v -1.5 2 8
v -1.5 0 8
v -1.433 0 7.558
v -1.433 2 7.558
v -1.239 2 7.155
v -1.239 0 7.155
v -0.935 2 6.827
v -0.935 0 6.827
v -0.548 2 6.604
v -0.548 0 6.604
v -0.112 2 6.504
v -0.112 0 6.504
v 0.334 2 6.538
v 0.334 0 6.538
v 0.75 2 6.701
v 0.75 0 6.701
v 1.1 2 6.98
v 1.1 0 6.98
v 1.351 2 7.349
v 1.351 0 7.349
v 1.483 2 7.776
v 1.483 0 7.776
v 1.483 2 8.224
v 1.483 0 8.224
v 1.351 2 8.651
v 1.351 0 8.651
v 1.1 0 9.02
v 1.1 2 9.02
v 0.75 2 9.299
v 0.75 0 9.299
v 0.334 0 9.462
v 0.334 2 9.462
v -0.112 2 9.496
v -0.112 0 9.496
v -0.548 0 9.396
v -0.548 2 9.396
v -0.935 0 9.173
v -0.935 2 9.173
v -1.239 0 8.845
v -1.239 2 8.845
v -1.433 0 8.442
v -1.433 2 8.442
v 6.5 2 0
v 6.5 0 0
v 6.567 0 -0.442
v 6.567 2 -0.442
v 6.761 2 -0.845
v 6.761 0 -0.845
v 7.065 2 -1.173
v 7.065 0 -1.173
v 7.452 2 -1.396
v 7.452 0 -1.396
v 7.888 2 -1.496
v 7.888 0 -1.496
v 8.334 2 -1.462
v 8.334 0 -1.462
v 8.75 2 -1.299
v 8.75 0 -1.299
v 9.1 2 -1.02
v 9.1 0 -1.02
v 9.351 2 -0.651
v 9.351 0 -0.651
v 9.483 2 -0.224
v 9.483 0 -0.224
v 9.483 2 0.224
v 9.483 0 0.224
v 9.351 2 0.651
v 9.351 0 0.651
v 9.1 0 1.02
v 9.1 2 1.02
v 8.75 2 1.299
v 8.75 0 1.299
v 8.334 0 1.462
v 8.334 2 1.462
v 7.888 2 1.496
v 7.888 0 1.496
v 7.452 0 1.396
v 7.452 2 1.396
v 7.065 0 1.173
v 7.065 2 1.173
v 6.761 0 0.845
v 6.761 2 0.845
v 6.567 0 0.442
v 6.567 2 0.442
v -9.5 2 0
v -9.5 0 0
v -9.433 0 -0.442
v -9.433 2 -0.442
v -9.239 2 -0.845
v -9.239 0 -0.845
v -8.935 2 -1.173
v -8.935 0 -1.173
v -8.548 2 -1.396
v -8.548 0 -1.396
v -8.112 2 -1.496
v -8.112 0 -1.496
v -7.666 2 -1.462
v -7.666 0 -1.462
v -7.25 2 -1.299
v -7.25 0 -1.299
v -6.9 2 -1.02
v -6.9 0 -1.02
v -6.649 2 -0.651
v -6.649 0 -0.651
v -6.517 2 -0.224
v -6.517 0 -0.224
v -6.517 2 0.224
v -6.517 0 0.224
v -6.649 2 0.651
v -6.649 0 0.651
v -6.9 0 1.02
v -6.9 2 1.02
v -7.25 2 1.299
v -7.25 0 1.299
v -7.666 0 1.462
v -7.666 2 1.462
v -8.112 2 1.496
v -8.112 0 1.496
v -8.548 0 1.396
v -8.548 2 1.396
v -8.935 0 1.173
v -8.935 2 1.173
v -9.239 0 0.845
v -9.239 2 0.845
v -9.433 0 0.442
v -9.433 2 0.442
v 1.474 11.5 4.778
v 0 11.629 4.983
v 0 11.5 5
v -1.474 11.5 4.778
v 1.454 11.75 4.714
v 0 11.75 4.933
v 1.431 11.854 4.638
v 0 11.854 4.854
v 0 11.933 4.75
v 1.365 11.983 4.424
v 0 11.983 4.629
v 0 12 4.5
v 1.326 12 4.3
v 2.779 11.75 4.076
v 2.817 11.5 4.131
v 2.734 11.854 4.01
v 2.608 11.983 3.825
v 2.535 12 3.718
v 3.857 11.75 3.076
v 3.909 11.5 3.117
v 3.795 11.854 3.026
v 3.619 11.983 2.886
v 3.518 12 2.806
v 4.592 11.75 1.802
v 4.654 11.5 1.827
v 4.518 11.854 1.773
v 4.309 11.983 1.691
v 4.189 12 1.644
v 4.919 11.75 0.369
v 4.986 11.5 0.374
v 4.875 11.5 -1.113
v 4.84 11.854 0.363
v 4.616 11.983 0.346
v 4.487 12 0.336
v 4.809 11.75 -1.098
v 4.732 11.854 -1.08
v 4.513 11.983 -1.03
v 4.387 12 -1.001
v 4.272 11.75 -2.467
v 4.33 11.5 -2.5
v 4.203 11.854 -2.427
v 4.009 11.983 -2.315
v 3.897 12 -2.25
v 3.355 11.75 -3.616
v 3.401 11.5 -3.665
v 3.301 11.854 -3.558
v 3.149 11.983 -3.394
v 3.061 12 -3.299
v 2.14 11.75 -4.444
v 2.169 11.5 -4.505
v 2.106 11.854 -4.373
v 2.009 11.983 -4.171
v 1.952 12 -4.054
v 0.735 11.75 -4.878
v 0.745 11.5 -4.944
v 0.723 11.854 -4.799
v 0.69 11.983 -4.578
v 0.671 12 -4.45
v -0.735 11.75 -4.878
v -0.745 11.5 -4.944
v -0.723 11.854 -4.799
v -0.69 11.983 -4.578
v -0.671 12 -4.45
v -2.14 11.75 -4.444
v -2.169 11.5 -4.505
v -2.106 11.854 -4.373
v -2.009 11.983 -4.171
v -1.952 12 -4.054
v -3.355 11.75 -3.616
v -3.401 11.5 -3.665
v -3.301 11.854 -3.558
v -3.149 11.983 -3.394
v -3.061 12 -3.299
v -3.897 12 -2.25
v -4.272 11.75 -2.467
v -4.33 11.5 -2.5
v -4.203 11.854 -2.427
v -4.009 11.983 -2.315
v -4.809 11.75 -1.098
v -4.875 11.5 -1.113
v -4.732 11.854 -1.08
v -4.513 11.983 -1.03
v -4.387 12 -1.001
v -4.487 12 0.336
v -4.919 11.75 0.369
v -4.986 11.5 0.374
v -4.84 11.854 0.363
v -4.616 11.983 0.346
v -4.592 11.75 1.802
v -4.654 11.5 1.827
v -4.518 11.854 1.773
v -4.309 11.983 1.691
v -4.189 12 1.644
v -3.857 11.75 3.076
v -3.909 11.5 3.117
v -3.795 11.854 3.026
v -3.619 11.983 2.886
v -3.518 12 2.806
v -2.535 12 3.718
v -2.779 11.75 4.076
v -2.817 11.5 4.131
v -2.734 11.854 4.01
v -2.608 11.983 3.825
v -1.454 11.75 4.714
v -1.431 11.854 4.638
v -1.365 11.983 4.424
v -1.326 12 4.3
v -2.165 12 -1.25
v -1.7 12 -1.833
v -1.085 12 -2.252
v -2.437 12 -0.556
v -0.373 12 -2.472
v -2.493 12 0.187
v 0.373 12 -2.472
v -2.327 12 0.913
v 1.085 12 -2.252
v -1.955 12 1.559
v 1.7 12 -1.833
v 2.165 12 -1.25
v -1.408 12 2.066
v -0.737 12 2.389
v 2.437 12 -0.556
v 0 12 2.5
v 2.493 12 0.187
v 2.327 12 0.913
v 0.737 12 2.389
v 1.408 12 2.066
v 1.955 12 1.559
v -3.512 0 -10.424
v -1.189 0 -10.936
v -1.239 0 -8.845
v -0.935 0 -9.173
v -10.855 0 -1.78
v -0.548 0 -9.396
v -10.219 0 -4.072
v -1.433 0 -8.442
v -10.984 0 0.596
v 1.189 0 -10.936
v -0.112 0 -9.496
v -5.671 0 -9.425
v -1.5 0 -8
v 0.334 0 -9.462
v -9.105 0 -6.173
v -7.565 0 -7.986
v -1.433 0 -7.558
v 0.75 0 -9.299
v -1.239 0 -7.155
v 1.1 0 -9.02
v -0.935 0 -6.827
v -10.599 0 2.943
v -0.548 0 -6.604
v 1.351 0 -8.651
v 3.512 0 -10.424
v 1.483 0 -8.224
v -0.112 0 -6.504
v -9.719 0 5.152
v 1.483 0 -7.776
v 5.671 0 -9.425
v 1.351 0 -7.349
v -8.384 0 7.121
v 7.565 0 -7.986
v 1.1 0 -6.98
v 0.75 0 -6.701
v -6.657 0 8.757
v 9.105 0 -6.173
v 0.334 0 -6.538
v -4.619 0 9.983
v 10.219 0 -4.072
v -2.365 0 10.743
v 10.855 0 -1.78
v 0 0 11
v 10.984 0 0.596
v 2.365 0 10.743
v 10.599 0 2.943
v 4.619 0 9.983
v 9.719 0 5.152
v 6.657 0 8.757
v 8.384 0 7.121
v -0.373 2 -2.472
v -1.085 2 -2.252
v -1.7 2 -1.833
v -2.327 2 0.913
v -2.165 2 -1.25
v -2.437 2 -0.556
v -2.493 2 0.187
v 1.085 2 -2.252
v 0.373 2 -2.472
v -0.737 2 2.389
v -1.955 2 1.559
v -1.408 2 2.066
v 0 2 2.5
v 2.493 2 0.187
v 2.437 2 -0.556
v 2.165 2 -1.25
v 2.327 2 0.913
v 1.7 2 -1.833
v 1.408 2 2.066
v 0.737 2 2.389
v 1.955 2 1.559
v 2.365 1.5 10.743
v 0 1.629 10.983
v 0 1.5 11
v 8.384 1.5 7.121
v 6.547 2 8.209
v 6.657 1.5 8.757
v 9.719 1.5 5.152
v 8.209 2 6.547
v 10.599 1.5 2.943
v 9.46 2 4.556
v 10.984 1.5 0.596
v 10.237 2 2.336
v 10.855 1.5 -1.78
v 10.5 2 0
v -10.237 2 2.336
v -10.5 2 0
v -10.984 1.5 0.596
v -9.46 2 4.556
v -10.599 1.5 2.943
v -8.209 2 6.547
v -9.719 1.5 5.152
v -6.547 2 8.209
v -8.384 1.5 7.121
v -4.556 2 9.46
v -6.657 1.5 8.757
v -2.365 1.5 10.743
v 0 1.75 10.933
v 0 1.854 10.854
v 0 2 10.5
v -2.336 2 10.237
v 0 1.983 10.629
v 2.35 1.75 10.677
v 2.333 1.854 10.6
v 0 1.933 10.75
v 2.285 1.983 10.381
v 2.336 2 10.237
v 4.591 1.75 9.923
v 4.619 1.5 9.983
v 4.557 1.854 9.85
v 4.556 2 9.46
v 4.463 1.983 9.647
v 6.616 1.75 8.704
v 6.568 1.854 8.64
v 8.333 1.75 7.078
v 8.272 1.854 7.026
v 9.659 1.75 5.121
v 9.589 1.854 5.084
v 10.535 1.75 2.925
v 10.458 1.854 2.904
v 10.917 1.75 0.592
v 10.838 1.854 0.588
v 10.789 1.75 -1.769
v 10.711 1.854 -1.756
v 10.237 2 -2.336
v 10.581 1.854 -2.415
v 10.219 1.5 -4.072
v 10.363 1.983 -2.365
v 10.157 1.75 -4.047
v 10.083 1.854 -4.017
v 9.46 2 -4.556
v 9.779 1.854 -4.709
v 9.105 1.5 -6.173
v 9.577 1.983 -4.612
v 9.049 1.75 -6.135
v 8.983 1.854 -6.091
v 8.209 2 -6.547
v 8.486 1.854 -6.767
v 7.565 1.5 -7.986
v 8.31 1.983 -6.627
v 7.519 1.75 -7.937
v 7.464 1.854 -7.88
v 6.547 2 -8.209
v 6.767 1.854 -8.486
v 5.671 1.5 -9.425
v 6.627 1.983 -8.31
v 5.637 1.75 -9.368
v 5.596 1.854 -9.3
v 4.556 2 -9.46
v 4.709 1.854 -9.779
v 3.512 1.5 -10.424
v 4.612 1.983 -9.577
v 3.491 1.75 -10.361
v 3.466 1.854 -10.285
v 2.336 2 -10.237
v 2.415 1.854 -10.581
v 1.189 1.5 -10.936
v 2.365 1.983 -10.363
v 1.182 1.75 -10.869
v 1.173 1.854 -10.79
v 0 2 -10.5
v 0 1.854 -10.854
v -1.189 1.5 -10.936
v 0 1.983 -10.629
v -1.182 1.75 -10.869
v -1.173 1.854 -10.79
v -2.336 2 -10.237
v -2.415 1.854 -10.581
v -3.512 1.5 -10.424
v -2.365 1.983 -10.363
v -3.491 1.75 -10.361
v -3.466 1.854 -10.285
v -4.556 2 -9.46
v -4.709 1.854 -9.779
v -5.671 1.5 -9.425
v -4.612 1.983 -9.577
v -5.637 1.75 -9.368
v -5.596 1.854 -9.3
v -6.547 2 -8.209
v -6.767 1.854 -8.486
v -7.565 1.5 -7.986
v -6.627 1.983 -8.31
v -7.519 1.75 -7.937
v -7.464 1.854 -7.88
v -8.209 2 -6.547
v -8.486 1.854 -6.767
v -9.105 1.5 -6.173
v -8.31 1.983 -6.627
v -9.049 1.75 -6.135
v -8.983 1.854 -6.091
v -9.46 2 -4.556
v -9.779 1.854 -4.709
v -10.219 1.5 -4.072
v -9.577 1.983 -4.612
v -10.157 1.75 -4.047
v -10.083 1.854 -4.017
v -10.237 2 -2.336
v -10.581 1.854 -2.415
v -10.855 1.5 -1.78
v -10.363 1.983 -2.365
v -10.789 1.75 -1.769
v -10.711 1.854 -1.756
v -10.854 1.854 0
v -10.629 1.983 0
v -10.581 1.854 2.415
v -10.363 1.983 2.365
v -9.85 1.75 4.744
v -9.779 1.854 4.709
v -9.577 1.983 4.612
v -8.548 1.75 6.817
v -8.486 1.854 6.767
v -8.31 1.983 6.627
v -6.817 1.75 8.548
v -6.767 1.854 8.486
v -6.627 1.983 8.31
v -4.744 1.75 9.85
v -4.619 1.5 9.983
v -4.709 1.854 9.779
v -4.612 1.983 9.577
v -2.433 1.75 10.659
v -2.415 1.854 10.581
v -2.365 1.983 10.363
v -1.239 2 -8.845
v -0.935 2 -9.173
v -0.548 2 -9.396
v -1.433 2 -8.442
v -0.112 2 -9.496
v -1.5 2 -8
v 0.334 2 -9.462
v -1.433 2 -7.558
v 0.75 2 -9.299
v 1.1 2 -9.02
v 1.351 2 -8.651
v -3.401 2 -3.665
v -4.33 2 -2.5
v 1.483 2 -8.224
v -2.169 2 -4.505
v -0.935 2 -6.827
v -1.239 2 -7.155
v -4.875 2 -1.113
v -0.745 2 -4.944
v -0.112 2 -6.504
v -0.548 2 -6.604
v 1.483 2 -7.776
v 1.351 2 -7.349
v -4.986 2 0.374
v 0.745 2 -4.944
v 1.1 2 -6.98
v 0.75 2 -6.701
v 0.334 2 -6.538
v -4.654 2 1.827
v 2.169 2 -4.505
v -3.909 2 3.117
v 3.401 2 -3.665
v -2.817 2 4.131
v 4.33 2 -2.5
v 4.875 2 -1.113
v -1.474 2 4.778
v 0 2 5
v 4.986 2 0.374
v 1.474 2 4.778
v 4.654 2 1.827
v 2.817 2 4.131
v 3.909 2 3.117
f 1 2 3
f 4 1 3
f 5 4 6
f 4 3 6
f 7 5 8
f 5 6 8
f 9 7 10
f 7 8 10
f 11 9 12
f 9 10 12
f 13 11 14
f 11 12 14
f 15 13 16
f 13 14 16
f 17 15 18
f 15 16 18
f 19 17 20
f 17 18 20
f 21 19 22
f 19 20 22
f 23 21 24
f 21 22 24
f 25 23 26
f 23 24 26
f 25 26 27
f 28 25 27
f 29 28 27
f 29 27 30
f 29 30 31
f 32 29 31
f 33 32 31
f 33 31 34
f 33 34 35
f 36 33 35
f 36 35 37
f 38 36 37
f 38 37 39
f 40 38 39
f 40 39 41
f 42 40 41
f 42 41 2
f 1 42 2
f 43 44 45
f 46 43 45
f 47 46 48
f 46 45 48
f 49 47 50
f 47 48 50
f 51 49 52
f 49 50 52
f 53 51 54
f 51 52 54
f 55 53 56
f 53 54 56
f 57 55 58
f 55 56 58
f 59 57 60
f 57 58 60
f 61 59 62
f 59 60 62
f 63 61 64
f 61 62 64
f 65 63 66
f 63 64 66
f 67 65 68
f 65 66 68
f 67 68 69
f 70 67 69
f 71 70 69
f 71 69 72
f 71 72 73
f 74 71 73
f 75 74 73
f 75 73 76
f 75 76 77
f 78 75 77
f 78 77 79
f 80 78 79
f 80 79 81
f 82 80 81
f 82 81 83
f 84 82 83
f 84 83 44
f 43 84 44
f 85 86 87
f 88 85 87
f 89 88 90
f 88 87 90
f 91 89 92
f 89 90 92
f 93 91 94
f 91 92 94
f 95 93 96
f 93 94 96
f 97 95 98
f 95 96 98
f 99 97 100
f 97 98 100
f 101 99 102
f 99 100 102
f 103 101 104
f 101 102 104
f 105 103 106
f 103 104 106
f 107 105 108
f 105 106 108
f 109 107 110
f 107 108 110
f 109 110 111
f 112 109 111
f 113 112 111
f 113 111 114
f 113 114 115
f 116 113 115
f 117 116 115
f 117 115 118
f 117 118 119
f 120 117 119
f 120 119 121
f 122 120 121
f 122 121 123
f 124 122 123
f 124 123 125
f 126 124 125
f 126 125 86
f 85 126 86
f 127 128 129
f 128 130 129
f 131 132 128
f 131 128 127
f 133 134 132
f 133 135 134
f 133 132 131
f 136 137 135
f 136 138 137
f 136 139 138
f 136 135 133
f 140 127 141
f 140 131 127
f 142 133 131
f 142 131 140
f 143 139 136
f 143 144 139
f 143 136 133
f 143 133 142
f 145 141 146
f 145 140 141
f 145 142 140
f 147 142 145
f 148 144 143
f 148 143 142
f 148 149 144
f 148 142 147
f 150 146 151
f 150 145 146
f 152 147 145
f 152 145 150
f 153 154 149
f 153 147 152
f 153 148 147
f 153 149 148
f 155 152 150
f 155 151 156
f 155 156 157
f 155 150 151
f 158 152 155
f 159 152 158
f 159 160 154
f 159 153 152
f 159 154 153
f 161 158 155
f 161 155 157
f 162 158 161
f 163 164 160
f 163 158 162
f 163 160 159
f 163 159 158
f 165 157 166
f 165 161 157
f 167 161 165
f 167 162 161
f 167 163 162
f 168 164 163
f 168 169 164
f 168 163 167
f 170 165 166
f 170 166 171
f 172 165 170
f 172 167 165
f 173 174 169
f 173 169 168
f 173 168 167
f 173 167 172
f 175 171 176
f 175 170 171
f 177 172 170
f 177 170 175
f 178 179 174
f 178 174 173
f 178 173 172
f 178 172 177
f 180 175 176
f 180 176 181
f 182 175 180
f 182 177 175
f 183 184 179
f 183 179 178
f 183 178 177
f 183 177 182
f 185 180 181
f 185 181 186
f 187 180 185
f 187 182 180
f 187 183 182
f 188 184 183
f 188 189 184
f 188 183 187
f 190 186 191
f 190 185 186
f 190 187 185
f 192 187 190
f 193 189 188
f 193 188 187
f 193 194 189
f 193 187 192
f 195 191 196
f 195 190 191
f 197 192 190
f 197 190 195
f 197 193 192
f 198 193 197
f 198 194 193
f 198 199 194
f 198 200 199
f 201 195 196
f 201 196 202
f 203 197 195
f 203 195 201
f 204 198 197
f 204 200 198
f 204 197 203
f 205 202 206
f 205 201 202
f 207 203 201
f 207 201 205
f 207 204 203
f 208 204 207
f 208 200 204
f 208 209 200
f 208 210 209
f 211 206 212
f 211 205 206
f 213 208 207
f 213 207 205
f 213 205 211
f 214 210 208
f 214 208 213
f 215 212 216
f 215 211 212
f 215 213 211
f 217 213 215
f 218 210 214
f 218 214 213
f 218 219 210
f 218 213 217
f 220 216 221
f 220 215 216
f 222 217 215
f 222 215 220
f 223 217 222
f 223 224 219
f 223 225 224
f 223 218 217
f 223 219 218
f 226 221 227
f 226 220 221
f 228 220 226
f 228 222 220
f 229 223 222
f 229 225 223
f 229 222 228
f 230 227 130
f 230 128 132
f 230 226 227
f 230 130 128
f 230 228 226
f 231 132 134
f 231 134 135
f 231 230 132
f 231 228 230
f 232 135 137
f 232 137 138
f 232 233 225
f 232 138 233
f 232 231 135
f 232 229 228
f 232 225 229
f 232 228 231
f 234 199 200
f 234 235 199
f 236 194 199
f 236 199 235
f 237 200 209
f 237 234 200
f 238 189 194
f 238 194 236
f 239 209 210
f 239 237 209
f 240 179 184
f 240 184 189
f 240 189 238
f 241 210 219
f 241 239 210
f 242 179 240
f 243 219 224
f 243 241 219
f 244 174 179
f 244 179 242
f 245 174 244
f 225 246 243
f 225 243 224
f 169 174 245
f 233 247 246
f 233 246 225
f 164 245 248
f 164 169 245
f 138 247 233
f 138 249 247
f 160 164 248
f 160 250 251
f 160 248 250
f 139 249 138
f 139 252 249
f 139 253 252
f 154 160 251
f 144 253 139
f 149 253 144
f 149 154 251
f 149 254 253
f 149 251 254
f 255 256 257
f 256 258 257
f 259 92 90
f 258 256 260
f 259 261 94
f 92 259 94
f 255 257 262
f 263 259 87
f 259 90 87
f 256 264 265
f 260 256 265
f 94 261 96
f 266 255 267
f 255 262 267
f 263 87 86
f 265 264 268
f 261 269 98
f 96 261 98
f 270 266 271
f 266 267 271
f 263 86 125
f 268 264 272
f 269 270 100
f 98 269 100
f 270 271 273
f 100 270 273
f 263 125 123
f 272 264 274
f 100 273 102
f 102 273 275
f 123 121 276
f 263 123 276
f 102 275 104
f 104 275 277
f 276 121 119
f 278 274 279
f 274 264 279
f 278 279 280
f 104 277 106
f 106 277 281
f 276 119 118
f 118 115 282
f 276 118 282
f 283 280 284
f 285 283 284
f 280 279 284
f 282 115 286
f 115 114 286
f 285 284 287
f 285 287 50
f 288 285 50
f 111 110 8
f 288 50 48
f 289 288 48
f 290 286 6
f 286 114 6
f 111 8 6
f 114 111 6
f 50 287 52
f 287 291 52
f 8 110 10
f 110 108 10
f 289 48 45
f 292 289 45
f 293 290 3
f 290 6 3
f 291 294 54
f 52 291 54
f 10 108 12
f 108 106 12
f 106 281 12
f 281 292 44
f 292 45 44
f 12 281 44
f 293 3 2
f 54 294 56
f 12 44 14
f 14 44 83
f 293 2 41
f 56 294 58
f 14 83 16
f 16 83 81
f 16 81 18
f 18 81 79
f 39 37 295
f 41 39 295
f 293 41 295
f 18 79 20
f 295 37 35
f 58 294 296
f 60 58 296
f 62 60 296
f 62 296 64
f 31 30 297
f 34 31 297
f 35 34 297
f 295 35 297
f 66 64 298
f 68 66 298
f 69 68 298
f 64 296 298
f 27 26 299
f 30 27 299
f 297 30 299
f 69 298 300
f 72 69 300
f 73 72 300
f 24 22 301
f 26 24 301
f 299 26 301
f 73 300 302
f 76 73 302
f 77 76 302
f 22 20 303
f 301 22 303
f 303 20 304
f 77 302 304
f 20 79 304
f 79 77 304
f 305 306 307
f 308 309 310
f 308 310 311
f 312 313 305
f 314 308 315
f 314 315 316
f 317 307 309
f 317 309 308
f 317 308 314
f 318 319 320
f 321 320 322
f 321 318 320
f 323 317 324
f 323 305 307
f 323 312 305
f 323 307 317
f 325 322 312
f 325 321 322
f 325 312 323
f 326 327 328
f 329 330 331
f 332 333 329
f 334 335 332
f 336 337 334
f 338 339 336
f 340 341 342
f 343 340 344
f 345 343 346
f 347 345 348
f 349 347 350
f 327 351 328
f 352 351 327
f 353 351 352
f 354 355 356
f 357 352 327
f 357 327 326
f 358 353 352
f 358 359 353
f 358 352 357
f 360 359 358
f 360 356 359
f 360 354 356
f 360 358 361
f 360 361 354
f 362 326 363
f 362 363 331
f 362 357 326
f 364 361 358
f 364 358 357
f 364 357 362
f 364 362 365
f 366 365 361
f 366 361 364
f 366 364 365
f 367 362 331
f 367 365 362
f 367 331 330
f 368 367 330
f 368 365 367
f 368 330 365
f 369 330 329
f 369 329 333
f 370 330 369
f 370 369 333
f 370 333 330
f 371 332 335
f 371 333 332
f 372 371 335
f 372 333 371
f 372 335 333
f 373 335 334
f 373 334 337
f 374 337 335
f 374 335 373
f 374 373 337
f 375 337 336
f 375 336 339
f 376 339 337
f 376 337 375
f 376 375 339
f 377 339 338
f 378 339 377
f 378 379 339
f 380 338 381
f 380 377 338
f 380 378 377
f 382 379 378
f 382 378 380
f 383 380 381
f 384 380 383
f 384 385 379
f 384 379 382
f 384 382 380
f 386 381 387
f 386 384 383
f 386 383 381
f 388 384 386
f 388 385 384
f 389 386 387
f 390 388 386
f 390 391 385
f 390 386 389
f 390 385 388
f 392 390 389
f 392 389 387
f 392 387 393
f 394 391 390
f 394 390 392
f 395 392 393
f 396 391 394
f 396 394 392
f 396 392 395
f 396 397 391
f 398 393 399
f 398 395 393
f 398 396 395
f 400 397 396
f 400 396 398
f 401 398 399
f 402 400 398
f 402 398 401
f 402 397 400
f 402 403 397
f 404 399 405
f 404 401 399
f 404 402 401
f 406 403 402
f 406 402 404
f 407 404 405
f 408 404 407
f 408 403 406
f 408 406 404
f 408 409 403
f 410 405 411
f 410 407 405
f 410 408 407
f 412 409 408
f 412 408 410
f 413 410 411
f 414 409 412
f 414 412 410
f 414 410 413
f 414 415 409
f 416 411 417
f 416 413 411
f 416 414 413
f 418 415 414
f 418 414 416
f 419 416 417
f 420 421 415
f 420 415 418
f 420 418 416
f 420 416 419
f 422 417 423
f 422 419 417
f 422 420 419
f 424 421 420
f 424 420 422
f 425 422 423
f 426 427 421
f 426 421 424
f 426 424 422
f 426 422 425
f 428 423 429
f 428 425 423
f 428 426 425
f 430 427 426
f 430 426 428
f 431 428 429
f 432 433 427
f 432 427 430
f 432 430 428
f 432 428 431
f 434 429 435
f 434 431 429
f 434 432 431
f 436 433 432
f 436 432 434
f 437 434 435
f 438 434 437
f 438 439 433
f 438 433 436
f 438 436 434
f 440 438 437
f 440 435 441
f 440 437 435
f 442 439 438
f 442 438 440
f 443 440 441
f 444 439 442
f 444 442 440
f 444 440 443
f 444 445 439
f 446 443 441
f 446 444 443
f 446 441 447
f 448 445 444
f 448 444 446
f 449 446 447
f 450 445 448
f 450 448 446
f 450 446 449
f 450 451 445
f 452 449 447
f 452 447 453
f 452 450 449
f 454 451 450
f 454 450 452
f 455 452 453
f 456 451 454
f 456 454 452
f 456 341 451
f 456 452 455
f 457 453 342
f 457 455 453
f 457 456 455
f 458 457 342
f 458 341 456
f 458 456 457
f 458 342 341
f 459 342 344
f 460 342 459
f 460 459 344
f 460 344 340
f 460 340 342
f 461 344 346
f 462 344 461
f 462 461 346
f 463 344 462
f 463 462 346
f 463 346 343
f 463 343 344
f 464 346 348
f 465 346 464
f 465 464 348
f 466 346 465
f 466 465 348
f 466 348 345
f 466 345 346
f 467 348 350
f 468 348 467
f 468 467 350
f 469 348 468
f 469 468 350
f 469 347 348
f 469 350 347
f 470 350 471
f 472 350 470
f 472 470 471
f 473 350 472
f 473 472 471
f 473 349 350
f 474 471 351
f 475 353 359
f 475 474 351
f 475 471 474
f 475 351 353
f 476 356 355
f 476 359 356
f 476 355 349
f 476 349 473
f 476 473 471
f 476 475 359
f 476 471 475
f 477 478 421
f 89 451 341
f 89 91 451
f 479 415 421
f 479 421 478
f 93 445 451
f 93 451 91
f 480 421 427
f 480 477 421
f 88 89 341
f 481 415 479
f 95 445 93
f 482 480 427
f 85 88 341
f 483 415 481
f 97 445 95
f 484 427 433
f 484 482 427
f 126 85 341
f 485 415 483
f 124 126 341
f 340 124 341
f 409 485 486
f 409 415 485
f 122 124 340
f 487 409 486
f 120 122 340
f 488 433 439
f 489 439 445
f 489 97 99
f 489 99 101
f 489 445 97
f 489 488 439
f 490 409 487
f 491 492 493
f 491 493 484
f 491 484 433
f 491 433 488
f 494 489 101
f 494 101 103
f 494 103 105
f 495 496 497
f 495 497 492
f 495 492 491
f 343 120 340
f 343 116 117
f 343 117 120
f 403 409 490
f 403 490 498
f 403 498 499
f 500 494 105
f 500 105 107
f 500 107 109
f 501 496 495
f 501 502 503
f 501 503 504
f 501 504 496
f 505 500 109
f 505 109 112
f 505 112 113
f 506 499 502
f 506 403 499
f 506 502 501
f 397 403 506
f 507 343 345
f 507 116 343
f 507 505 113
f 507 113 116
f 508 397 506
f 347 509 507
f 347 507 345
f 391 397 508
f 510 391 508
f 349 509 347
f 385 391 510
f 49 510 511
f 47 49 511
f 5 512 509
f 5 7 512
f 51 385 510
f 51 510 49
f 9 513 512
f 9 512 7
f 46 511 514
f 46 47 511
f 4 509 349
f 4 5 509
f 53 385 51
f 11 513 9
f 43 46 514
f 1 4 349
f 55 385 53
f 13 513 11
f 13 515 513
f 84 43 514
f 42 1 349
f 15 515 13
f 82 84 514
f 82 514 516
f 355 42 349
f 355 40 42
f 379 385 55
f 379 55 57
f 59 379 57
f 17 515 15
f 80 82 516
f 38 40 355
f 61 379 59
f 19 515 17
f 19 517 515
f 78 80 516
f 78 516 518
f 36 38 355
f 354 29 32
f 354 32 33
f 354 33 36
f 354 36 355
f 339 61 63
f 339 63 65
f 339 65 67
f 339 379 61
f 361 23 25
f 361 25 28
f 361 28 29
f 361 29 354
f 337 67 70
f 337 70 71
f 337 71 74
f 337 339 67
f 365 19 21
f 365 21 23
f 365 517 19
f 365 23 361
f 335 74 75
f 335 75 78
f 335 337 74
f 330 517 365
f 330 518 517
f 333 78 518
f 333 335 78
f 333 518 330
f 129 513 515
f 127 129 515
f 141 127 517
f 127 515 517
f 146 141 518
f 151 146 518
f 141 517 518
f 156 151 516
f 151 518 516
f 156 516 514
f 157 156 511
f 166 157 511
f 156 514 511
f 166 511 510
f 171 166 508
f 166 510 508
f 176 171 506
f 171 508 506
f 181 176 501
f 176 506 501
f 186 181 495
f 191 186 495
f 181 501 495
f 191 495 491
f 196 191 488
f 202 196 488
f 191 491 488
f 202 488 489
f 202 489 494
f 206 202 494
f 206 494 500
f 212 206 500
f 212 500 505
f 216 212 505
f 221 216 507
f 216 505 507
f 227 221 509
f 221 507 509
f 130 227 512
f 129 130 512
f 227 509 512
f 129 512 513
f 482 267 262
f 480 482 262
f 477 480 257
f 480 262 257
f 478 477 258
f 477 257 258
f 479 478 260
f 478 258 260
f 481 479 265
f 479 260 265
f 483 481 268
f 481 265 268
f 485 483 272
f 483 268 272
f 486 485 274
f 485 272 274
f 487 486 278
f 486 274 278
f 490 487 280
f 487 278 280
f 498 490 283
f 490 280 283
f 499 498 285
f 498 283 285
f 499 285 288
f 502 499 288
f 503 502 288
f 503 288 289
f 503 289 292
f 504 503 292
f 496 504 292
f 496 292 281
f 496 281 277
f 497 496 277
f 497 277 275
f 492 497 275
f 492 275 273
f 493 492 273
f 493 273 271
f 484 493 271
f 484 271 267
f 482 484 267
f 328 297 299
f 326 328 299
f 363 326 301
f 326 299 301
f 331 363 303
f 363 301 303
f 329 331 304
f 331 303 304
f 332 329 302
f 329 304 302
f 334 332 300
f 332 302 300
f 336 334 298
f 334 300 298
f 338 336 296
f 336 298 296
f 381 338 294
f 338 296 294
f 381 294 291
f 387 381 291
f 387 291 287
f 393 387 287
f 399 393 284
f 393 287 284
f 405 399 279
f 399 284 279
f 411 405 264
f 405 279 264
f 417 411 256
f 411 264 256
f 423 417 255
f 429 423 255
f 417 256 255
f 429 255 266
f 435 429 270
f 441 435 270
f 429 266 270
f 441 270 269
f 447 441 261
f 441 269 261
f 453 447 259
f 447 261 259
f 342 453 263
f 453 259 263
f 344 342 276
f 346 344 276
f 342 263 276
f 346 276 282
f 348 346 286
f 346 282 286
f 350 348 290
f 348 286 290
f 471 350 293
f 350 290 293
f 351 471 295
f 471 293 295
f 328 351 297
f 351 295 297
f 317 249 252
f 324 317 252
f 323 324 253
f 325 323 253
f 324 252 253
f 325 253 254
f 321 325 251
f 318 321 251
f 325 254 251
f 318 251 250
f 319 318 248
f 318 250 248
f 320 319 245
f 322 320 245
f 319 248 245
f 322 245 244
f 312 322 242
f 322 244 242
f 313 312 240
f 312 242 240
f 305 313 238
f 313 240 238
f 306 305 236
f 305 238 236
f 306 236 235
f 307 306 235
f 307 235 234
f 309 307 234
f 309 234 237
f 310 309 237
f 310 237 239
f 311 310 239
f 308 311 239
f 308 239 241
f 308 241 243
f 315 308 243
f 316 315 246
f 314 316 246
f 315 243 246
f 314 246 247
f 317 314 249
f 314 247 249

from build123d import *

# Parameters (mm, degrees)
SKETCH_1_R          = 11
EXTRUDE_1_DEPTH     = 2
SKETCH_2_R          = 5
EXTRUDE_2_DEPTH     = 10
SKETCH_3_R          = 2.5
CUT_EXTRUDE_1_DEPTH = 10
HOLE_WIZARD_1_D     = 3
FILLET_1_R          = 0.5


with BuildPart() as part:
    # 草图1 → 凸台-拉伸1 (new body)
    with BuildSketch(Plane(origin=(0, 0, 0), x_dir=(1, 0, 0), z_dir=(0, 1, 0))):
        with Locations(Location((0, 0, 0), (0, 0, 270))):
            Circle(SKETCH_1_R)
    extrude(amount=EXTRUDE_1_DEPTH)

    # 草图2 → 凸台-拉伸2 (add)
    with BuildSketch(Plane(origin=(0, 2, 0), x_dir=(1, 0, 0), z_dir=(0, 1, 0))):
        with Locations(Location((0, 0, 0), (0, 0, 270))):
            Circle(SKETCH_2_R)
    extrude(amount=EXTRUDE_2_DEPTH)

    # 草图3 → 切除-拉伸1 (cut)
    with BuildSketch(Plane(origin=(0, 12, 0), x_dir=(1, 0, 0), z_dir=(0, 1, 0))):
        with Locations(Location((0, 0, 0), (0, 0, 270))):
            Circle(SKETCH_3_R)
    extrude(amount=-CUT_EXTRUDE_1_DEPTH, mode=Mode.SUBTRACT)

    # 孔1 (through all)
    with Locations(Plane(origin=(0, 2, 0), x_dir=(1, 0, 0), z_dir=(0, 1, 0))):
        with Locations((0, 8), (8, 0), (0, -8), (-8, 0)):
            Hole(HOLE_WIZARD_1_D / 2)

    # 圆角1
    fillet_1_edges = [part.edges().sort_by_distance(p)[0] for p in [
        (0, 2, -11),
        (0, 12, -5),
    ]]
    fillet(fillet_1_edges, radius=FILLET_1_R)


solid = part.part
